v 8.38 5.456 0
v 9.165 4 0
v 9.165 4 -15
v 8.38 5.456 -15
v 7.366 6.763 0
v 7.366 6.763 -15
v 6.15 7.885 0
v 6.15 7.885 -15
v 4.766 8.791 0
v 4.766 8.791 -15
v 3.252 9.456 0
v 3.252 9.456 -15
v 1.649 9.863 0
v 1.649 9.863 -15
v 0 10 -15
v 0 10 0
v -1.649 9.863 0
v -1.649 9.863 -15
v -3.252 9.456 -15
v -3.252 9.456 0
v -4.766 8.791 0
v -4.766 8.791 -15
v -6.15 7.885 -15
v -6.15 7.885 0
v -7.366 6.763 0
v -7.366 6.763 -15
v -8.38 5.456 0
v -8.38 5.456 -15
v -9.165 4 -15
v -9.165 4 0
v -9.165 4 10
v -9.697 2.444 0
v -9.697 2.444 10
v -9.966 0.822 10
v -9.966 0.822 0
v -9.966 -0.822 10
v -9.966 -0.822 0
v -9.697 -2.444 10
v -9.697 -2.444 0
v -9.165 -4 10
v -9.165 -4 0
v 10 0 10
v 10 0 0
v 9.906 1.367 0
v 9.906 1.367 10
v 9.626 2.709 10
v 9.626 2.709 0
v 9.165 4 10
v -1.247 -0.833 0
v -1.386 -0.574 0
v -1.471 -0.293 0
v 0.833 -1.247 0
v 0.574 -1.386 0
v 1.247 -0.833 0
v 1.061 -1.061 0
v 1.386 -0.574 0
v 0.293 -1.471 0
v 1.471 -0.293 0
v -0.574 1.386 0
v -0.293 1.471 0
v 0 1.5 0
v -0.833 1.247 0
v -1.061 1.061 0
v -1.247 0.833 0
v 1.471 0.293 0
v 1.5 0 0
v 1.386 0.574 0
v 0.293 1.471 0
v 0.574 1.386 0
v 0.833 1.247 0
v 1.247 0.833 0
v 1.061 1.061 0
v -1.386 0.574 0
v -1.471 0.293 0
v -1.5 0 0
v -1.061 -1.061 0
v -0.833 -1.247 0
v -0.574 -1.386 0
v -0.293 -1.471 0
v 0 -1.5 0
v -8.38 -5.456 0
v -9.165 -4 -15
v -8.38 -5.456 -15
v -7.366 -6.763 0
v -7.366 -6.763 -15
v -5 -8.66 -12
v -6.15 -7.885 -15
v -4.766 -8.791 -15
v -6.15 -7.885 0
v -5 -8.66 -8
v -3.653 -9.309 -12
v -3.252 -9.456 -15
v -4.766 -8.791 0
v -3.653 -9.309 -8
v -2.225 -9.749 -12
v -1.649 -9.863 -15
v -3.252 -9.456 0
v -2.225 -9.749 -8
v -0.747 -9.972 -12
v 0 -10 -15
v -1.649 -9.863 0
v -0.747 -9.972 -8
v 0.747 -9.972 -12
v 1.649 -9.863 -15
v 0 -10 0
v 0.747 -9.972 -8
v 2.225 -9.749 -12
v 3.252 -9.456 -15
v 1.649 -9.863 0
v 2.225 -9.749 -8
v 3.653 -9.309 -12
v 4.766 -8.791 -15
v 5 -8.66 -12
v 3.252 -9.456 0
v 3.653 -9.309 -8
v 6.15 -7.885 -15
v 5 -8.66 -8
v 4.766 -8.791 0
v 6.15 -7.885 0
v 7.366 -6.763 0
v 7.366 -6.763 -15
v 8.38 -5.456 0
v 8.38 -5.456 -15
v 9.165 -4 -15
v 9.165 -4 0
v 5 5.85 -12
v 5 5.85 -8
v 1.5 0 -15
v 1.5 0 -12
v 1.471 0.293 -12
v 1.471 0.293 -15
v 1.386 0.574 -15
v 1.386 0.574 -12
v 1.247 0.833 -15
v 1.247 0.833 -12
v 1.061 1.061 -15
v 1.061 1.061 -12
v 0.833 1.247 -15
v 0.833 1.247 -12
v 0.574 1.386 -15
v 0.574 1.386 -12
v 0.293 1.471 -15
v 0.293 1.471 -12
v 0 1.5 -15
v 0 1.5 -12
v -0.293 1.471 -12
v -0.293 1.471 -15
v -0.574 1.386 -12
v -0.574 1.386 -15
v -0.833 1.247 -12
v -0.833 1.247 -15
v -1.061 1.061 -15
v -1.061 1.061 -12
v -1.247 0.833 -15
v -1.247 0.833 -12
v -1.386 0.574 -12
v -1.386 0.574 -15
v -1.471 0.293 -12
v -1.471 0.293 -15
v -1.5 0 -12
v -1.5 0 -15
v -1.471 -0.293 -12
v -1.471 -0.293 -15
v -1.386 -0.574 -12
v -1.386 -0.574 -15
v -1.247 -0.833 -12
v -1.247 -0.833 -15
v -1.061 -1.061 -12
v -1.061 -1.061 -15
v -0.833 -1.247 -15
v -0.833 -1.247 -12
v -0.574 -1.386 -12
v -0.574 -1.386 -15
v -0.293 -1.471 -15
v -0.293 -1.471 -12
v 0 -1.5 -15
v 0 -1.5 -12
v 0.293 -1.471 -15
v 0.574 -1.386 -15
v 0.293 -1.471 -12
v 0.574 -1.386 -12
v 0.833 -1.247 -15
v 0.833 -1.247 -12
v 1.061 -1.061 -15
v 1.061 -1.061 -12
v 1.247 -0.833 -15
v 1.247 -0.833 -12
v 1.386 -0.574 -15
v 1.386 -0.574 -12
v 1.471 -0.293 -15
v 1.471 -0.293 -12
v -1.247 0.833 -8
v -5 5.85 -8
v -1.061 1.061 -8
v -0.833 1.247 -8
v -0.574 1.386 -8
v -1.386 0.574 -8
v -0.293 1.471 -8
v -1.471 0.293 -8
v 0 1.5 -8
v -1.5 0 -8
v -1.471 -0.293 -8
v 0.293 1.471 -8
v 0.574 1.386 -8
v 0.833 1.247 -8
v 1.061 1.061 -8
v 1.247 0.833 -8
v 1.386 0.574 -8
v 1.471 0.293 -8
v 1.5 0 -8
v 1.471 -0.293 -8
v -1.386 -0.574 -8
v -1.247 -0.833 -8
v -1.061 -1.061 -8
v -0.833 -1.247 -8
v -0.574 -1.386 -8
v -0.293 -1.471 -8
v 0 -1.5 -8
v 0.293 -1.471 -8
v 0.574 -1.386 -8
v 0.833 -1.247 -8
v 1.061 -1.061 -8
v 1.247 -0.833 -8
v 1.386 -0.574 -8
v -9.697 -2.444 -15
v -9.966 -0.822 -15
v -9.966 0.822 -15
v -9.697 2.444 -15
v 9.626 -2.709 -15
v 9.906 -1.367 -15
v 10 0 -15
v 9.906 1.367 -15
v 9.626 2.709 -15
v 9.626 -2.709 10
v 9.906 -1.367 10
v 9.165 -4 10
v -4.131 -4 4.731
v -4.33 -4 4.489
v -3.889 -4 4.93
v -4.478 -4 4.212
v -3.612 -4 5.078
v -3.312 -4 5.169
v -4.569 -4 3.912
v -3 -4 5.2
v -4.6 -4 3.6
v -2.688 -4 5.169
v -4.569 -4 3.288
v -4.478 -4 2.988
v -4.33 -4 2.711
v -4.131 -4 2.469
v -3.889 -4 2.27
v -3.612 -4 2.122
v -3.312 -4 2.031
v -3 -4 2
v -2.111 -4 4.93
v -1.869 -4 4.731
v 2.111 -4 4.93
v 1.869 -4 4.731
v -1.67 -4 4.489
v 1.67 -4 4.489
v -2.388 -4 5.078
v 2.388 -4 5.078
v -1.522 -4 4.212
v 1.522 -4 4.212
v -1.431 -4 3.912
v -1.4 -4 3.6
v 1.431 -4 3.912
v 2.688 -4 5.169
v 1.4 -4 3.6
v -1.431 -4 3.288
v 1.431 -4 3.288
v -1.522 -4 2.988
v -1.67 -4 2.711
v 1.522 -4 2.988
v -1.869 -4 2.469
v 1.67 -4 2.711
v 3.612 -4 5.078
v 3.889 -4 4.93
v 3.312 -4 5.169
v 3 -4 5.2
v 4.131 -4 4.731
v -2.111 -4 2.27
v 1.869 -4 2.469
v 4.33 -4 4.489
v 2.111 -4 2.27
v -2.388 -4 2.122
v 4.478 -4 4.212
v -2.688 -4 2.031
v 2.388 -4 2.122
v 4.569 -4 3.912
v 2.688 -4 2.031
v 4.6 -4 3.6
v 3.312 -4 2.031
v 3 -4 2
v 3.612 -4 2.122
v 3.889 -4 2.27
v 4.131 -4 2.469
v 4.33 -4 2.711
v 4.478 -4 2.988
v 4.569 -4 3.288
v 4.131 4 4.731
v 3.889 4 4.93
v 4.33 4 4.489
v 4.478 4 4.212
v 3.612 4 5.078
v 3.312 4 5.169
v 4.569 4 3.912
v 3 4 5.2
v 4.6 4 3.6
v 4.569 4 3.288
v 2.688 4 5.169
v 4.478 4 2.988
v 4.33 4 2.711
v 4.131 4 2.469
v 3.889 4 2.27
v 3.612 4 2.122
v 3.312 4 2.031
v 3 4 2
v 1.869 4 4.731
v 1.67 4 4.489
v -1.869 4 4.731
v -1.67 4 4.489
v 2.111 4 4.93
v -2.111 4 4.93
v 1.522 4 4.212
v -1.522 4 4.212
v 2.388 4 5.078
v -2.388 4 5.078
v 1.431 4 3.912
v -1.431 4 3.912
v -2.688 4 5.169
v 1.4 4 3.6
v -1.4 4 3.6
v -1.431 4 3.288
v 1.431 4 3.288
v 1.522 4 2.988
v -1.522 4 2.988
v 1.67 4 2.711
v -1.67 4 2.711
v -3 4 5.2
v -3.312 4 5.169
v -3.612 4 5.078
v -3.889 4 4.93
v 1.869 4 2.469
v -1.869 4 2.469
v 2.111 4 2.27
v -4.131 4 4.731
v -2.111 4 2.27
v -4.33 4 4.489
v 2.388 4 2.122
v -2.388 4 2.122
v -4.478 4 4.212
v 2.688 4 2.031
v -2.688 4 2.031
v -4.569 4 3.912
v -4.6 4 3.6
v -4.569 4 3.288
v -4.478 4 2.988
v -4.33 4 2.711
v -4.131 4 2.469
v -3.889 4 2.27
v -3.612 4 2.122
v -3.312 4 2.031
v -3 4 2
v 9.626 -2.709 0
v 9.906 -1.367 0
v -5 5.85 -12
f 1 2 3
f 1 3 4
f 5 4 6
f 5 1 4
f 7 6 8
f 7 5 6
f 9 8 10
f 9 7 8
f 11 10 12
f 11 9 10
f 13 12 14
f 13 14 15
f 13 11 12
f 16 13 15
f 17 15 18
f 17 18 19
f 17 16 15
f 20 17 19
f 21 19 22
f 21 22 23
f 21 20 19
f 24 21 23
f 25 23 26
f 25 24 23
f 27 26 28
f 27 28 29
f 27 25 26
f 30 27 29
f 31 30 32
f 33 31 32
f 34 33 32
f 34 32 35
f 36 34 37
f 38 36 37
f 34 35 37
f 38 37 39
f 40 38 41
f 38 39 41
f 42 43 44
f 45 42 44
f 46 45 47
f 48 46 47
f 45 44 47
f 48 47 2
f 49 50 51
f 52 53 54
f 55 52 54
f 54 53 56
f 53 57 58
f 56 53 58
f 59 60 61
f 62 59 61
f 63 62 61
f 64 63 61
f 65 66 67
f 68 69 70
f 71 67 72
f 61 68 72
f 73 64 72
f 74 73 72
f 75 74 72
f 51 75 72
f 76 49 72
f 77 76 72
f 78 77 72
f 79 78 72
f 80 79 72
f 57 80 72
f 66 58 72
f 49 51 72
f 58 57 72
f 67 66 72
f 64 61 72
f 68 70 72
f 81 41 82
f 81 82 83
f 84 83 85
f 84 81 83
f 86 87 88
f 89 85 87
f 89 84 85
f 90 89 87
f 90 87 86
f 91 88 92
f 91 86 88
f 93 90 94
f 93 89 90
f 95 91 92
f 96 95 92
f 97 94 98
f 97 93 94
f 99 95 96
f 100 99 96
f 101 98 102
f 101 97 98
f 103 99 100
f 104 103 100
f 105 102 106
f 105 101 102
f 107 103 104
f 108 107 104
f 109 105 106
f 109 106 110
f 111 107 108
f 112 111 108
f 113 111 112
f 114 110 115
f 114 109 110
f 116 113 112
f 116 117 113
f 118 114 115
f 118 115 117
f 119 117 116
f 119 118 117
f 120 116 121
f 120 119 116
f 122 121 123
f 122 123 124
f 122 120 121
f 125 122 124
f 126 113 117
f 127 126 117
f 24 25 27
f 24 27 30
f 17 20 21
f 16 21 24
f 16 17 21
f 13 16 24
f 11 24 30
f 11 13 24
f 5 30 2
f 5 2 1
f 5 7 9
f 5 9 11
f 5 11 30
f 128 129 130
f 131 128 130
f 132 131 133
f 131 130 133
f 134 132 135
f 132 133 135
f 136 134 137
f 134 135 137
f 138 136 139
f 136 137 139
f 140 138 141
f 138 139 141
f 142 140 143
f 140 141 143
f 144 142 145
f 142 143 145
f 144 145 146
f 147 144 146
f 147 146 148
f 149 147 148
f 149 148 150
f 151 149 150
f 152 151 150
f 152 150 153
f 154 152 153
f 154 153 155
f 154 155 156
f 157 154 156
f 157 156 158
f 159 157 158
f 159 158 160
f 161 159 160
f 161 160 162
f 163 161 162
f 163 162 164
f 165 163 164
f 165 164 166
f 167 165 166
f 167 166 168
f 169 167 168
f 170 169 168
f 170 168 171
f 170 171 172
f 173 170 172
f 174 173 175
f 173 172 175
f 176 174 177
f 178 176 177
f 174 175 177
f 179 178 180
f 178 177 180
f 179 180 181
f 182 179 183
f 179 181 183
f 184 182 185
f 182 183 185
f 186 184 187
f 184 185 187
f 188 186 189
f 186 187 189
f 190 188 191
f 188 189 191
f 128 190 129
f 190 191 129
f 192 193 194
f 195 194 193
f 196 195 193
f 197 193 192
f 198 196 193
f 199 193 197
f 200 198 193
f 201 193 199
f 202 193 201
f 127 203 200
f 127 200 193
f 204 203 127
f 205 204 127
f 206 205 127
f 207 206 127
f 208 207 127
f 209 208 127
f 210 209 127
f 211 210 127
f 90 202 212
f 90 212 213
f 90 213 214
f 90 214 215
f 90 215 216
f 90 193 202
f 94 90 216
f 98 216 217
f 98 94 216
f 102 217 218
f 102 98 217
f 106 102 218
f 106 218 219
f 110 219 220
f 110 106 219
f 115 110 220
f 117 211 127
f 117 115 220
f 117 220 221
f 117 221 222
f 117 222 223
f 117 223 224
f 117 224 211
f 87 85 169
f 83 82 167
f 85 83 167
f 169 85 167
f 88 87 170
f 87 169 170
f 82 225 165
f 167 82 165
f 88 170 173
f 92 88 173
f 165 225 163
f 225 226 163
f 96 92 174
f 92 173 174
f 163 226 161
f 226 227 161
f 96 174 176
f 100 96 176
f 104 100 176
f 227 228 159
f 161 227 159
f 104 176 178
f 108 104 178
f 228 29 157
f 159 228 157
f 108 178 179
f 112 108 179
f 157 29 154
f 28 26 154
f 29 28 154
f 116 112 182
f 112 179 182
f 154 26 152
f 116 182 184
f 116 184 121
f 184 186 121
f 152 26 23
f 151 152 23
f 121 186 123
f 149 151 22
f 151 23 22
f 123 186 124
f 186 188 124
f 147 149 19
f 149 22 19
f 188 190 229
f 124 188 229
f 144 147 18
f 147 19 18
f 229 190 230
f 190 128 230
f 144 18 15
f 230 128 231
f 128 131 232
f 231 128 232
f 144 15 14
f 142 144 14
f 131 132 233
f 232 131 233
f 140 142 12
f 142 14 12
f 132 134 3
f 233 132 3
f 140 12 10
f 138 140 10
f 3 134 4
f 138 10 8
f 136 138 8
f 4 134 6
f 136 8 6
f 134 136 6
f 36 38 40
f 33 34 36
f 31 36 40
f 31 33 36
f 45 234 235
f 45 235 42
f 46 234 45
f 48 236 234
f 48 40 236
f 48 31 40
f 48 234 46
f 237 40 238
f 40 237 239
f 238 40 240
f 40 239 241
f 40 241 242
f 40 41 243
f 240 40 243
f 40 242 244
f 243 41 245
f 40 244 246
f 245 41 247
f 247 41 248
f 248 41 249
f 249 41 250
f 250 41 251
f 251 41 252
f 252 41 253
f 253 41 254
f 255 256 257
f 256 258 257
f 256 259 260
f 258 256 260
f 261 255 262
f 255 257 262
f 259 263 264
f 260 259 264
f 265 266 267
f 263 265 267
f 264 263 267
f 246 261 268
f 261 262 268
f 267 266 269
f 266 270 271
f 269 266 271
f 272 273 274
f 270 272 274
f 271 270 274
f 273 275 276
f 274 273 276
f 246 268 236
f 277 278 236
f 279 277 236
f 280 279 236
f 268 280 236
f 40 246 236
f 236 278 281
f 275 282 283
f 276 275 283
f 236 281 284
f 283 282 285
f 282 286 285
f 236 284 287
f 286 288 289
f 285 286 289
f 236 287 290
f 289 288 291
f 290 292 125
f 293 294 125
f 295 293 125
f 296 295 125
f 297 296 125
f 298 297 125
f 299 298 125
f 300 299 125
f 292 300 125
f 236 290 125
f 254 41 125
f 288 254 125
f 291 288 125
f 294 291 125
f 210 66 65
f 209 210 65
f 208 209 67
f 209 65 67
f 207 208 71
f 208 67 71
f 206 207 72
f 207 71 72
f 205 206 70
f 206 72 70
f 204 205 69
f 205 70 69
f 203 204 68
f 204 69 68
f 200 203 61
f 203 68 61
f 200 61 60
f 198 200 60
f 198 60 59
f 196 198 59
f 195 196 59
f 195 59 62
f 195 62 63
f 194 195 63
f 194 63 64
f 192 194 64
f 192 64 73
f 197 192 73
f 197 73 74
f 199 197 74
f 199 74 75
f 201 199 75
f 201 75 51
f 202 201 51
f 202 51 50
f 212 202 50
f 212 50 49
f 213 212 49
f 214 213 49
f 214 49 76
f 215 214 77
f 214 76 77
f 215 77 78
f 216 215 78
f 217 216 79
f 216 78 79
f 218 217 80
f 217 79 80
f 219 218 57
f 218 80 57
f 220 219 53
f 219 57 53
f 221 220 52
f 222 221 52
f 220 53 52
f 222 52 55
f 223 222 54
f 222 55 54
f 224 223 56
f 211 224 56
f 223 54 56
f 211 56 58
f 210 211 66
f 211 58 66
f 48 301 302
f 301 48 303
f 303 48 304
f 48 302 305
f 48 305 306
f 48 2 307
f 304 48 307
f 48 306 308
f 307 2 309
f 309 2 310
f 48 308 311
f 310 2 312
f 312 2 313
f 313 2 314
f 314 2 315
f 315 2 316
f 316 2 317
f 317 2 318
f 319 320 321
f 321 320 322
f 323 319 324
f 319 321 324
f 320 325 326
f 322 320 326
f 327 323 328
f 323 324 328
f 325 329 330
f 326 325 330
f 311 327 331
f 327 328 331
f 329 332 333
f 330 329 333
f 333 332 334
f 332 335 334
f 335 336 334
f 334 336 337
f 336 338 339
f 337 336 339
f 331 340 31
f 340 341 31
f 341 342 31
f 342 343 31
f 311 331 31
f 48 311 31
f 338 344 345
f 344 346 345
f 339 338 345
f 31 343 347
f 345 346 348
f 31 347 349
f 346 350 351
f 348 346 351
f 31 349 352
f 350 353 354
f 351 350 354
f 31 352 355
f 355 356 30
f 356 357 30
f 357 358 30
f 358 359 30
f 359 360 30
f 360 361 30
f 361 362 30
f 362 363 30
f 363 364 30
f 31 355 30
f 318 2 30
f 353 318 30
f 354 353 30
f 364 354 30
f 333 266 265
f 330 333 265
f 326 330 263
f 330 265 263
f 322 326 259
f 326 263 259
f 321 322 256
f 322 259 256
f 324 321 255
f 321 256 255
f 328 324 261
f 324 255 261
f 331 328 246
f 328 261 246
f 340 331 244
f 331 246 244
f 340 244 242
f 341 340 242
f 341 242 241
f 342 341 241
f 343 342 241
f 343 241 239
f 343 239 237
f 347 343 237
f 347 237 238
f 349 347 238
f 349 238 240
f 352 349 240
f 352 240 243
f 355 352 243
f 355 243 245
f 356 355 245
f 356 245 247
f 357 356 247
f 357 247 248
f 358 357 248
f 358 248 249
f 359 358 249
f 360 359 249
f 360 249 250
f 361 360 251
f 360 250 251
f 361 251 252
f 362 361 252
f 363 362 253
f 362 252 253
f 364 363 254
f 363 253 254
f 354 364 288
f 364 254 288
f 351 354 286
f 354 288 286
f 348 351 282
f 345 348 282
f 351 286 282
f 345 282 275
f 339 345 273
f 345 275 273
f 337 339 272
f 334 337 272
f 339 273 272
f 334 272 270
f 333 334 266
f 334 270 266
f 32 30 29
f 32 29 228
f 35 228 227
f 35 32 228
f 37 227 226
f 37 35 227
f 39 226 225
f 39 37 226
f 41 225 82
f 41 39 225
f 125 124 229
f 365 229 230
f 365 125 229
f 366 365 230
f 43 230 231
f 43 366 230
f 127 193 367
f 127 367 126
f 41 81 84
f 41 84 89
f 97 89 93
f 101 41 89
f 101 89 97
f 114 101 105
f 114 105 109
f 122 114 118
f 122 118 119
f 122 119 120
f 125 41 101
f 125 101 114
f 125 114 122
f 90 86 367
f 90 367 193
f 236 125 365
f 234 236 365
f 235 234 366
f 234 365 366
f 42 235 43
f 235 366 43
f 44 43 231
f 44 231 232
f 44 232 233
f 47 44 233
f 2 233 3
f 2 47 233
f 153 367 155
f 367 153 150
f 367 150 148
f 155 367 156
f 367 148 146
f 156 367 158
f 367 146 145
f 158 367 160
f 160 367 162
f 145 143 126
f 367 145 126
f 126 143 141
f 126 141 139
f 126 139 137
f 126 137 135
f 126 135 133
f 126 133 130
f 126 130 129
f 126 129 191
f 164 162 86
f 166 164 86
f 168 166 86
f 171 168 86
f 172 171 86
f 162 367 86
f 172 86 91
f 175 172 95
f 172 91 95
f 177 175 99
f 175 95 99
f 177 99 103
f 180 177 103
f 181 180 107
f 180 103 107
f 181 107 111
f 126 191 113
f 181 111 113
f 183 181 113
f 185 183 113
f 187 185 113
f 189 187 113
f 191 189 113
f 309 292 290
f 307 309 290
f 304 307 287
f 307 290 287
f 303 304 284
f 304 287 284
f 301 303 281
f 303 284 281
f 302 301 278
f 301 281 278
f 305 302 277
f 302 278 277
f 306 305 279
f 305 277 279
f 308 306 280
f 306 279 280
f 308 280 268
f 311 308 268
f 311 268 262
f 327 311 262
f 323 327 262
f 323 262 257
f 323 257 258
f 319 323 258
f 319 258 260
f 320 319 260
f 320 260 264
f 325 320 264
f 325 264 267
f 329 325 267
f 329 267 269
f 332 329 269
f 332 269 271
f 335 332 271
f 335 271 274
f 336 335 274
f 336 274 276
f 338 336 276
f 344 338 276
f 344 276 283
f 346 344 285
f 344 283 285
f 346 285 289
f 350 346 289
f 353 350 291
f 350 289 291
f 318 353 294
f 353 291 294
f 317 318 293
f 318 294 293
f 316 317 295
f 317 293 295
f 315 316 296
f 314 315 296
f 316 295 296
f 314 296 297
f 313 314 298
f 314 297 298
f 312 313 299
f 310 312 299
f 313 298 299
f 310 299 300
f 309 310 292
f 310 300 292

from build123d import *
from build123d import SkipClean  # not in build123d's __all__

# Parameters (mm, degrees)
F0_R     = 1.5
F1_DEPTH = 15
F3_W     = 10
F3_H     = 4
F5_DEPTH = 45.85
F6_DEPTH = 10
F7_R     = 1.6
F8_DEPTH = 14.001


# Not quite as in the source:
# - after a boolean that leaves OpenCascade's solid faulty, fix() repairs it


with BuildPart() as f1:
    # F0 (on Top) → F1 (new body)
    with BuildSketch(Plane.XY):
        with BuildLine():
            ThreePointArc((9.1651513899, -4), (9.7890631293, -2.0430964369), (10, 0))
            ThreePointArc((10, 0), (9.7890631293, 2.0430964369), (9.1651513899, 4))
            Line((9.1651513899, 4), (-9.1651513899, 4))
            ThreePointArc((-9.1651513899, 4), (-10, 0), (-9.1651513899, -4))
            Line((-9.1651513899, -4), (9.1651513899, -4))
        make_face()
        Circle(F0_R, mode=Mode.SUBTRACT)
        with BuildLine():
            ThreePointArc((-9.1651513899, -4), (0, -10), (9.1651513899, -4))
            Line((9.1651513899, -4), (-9.1651513899, -4))
        make_face()
        with BuildLine():
            Line((-9.1651513899, 4), (9.1651513899, 4))
            ThreePointArc((9.1651513899, 4), (0, 10), (-9.1651513899, 4))
        make_face()
    extrude(amount=-F1_DEPTH)

    # F3 (on offset) → F5 (cut, through all)
    with BuildSketch(Plane.XZ.offset(40)):
        with Locations((0, -10)):
            Rectangle(F3_W, F3_H)
    extrude(amount=-F5_DEPTH, mode=Mode.SUBTRACT)

    # F0 (on Top) → F6 (join)
    with BuildSketch(Plane.XY):
        with BuildLine():
            ThreePointArc((9.1651513899, -4), (9.7890631293, -2.0430964369), (10, 0))
            ThreePointArc((10, 0), (9.7890631293, 2.0430964369), (9.1651513899, 4))
            Line((9.1651513899, 4), (-9.1651513899, 4))
            ThreePointArc((-9.1651513899, 4), (-10, 0), (-9.1651513899, -4))
            Line((-9.1651513899, -4), (9.1651513899, -4))
        make_face()
        Circle(F0_R, mode=Mode.SUBTRACT)
        Circle(F0_R)
    with SkipClean():  # cleaning this boolean's faces spoils the solid; the shape is the same uncleaned
        extrude(amount=F6_DEPTH)

    # F7 (on face) → F8 (cut, through all)
    with BuildSketch(Plane.XZ.offset(4)):
        with Locations((-3, 3.6)):
            Circle(F7_R)
        with Locations((3, 3.6)):
            Circle(F7_R)
    extrude(amount=-F8_DEPTH, mode=Mode.SUBTRACT)

    add(f1.part.fix(), mode=Mode.REPLACE)


solid = f1.part
